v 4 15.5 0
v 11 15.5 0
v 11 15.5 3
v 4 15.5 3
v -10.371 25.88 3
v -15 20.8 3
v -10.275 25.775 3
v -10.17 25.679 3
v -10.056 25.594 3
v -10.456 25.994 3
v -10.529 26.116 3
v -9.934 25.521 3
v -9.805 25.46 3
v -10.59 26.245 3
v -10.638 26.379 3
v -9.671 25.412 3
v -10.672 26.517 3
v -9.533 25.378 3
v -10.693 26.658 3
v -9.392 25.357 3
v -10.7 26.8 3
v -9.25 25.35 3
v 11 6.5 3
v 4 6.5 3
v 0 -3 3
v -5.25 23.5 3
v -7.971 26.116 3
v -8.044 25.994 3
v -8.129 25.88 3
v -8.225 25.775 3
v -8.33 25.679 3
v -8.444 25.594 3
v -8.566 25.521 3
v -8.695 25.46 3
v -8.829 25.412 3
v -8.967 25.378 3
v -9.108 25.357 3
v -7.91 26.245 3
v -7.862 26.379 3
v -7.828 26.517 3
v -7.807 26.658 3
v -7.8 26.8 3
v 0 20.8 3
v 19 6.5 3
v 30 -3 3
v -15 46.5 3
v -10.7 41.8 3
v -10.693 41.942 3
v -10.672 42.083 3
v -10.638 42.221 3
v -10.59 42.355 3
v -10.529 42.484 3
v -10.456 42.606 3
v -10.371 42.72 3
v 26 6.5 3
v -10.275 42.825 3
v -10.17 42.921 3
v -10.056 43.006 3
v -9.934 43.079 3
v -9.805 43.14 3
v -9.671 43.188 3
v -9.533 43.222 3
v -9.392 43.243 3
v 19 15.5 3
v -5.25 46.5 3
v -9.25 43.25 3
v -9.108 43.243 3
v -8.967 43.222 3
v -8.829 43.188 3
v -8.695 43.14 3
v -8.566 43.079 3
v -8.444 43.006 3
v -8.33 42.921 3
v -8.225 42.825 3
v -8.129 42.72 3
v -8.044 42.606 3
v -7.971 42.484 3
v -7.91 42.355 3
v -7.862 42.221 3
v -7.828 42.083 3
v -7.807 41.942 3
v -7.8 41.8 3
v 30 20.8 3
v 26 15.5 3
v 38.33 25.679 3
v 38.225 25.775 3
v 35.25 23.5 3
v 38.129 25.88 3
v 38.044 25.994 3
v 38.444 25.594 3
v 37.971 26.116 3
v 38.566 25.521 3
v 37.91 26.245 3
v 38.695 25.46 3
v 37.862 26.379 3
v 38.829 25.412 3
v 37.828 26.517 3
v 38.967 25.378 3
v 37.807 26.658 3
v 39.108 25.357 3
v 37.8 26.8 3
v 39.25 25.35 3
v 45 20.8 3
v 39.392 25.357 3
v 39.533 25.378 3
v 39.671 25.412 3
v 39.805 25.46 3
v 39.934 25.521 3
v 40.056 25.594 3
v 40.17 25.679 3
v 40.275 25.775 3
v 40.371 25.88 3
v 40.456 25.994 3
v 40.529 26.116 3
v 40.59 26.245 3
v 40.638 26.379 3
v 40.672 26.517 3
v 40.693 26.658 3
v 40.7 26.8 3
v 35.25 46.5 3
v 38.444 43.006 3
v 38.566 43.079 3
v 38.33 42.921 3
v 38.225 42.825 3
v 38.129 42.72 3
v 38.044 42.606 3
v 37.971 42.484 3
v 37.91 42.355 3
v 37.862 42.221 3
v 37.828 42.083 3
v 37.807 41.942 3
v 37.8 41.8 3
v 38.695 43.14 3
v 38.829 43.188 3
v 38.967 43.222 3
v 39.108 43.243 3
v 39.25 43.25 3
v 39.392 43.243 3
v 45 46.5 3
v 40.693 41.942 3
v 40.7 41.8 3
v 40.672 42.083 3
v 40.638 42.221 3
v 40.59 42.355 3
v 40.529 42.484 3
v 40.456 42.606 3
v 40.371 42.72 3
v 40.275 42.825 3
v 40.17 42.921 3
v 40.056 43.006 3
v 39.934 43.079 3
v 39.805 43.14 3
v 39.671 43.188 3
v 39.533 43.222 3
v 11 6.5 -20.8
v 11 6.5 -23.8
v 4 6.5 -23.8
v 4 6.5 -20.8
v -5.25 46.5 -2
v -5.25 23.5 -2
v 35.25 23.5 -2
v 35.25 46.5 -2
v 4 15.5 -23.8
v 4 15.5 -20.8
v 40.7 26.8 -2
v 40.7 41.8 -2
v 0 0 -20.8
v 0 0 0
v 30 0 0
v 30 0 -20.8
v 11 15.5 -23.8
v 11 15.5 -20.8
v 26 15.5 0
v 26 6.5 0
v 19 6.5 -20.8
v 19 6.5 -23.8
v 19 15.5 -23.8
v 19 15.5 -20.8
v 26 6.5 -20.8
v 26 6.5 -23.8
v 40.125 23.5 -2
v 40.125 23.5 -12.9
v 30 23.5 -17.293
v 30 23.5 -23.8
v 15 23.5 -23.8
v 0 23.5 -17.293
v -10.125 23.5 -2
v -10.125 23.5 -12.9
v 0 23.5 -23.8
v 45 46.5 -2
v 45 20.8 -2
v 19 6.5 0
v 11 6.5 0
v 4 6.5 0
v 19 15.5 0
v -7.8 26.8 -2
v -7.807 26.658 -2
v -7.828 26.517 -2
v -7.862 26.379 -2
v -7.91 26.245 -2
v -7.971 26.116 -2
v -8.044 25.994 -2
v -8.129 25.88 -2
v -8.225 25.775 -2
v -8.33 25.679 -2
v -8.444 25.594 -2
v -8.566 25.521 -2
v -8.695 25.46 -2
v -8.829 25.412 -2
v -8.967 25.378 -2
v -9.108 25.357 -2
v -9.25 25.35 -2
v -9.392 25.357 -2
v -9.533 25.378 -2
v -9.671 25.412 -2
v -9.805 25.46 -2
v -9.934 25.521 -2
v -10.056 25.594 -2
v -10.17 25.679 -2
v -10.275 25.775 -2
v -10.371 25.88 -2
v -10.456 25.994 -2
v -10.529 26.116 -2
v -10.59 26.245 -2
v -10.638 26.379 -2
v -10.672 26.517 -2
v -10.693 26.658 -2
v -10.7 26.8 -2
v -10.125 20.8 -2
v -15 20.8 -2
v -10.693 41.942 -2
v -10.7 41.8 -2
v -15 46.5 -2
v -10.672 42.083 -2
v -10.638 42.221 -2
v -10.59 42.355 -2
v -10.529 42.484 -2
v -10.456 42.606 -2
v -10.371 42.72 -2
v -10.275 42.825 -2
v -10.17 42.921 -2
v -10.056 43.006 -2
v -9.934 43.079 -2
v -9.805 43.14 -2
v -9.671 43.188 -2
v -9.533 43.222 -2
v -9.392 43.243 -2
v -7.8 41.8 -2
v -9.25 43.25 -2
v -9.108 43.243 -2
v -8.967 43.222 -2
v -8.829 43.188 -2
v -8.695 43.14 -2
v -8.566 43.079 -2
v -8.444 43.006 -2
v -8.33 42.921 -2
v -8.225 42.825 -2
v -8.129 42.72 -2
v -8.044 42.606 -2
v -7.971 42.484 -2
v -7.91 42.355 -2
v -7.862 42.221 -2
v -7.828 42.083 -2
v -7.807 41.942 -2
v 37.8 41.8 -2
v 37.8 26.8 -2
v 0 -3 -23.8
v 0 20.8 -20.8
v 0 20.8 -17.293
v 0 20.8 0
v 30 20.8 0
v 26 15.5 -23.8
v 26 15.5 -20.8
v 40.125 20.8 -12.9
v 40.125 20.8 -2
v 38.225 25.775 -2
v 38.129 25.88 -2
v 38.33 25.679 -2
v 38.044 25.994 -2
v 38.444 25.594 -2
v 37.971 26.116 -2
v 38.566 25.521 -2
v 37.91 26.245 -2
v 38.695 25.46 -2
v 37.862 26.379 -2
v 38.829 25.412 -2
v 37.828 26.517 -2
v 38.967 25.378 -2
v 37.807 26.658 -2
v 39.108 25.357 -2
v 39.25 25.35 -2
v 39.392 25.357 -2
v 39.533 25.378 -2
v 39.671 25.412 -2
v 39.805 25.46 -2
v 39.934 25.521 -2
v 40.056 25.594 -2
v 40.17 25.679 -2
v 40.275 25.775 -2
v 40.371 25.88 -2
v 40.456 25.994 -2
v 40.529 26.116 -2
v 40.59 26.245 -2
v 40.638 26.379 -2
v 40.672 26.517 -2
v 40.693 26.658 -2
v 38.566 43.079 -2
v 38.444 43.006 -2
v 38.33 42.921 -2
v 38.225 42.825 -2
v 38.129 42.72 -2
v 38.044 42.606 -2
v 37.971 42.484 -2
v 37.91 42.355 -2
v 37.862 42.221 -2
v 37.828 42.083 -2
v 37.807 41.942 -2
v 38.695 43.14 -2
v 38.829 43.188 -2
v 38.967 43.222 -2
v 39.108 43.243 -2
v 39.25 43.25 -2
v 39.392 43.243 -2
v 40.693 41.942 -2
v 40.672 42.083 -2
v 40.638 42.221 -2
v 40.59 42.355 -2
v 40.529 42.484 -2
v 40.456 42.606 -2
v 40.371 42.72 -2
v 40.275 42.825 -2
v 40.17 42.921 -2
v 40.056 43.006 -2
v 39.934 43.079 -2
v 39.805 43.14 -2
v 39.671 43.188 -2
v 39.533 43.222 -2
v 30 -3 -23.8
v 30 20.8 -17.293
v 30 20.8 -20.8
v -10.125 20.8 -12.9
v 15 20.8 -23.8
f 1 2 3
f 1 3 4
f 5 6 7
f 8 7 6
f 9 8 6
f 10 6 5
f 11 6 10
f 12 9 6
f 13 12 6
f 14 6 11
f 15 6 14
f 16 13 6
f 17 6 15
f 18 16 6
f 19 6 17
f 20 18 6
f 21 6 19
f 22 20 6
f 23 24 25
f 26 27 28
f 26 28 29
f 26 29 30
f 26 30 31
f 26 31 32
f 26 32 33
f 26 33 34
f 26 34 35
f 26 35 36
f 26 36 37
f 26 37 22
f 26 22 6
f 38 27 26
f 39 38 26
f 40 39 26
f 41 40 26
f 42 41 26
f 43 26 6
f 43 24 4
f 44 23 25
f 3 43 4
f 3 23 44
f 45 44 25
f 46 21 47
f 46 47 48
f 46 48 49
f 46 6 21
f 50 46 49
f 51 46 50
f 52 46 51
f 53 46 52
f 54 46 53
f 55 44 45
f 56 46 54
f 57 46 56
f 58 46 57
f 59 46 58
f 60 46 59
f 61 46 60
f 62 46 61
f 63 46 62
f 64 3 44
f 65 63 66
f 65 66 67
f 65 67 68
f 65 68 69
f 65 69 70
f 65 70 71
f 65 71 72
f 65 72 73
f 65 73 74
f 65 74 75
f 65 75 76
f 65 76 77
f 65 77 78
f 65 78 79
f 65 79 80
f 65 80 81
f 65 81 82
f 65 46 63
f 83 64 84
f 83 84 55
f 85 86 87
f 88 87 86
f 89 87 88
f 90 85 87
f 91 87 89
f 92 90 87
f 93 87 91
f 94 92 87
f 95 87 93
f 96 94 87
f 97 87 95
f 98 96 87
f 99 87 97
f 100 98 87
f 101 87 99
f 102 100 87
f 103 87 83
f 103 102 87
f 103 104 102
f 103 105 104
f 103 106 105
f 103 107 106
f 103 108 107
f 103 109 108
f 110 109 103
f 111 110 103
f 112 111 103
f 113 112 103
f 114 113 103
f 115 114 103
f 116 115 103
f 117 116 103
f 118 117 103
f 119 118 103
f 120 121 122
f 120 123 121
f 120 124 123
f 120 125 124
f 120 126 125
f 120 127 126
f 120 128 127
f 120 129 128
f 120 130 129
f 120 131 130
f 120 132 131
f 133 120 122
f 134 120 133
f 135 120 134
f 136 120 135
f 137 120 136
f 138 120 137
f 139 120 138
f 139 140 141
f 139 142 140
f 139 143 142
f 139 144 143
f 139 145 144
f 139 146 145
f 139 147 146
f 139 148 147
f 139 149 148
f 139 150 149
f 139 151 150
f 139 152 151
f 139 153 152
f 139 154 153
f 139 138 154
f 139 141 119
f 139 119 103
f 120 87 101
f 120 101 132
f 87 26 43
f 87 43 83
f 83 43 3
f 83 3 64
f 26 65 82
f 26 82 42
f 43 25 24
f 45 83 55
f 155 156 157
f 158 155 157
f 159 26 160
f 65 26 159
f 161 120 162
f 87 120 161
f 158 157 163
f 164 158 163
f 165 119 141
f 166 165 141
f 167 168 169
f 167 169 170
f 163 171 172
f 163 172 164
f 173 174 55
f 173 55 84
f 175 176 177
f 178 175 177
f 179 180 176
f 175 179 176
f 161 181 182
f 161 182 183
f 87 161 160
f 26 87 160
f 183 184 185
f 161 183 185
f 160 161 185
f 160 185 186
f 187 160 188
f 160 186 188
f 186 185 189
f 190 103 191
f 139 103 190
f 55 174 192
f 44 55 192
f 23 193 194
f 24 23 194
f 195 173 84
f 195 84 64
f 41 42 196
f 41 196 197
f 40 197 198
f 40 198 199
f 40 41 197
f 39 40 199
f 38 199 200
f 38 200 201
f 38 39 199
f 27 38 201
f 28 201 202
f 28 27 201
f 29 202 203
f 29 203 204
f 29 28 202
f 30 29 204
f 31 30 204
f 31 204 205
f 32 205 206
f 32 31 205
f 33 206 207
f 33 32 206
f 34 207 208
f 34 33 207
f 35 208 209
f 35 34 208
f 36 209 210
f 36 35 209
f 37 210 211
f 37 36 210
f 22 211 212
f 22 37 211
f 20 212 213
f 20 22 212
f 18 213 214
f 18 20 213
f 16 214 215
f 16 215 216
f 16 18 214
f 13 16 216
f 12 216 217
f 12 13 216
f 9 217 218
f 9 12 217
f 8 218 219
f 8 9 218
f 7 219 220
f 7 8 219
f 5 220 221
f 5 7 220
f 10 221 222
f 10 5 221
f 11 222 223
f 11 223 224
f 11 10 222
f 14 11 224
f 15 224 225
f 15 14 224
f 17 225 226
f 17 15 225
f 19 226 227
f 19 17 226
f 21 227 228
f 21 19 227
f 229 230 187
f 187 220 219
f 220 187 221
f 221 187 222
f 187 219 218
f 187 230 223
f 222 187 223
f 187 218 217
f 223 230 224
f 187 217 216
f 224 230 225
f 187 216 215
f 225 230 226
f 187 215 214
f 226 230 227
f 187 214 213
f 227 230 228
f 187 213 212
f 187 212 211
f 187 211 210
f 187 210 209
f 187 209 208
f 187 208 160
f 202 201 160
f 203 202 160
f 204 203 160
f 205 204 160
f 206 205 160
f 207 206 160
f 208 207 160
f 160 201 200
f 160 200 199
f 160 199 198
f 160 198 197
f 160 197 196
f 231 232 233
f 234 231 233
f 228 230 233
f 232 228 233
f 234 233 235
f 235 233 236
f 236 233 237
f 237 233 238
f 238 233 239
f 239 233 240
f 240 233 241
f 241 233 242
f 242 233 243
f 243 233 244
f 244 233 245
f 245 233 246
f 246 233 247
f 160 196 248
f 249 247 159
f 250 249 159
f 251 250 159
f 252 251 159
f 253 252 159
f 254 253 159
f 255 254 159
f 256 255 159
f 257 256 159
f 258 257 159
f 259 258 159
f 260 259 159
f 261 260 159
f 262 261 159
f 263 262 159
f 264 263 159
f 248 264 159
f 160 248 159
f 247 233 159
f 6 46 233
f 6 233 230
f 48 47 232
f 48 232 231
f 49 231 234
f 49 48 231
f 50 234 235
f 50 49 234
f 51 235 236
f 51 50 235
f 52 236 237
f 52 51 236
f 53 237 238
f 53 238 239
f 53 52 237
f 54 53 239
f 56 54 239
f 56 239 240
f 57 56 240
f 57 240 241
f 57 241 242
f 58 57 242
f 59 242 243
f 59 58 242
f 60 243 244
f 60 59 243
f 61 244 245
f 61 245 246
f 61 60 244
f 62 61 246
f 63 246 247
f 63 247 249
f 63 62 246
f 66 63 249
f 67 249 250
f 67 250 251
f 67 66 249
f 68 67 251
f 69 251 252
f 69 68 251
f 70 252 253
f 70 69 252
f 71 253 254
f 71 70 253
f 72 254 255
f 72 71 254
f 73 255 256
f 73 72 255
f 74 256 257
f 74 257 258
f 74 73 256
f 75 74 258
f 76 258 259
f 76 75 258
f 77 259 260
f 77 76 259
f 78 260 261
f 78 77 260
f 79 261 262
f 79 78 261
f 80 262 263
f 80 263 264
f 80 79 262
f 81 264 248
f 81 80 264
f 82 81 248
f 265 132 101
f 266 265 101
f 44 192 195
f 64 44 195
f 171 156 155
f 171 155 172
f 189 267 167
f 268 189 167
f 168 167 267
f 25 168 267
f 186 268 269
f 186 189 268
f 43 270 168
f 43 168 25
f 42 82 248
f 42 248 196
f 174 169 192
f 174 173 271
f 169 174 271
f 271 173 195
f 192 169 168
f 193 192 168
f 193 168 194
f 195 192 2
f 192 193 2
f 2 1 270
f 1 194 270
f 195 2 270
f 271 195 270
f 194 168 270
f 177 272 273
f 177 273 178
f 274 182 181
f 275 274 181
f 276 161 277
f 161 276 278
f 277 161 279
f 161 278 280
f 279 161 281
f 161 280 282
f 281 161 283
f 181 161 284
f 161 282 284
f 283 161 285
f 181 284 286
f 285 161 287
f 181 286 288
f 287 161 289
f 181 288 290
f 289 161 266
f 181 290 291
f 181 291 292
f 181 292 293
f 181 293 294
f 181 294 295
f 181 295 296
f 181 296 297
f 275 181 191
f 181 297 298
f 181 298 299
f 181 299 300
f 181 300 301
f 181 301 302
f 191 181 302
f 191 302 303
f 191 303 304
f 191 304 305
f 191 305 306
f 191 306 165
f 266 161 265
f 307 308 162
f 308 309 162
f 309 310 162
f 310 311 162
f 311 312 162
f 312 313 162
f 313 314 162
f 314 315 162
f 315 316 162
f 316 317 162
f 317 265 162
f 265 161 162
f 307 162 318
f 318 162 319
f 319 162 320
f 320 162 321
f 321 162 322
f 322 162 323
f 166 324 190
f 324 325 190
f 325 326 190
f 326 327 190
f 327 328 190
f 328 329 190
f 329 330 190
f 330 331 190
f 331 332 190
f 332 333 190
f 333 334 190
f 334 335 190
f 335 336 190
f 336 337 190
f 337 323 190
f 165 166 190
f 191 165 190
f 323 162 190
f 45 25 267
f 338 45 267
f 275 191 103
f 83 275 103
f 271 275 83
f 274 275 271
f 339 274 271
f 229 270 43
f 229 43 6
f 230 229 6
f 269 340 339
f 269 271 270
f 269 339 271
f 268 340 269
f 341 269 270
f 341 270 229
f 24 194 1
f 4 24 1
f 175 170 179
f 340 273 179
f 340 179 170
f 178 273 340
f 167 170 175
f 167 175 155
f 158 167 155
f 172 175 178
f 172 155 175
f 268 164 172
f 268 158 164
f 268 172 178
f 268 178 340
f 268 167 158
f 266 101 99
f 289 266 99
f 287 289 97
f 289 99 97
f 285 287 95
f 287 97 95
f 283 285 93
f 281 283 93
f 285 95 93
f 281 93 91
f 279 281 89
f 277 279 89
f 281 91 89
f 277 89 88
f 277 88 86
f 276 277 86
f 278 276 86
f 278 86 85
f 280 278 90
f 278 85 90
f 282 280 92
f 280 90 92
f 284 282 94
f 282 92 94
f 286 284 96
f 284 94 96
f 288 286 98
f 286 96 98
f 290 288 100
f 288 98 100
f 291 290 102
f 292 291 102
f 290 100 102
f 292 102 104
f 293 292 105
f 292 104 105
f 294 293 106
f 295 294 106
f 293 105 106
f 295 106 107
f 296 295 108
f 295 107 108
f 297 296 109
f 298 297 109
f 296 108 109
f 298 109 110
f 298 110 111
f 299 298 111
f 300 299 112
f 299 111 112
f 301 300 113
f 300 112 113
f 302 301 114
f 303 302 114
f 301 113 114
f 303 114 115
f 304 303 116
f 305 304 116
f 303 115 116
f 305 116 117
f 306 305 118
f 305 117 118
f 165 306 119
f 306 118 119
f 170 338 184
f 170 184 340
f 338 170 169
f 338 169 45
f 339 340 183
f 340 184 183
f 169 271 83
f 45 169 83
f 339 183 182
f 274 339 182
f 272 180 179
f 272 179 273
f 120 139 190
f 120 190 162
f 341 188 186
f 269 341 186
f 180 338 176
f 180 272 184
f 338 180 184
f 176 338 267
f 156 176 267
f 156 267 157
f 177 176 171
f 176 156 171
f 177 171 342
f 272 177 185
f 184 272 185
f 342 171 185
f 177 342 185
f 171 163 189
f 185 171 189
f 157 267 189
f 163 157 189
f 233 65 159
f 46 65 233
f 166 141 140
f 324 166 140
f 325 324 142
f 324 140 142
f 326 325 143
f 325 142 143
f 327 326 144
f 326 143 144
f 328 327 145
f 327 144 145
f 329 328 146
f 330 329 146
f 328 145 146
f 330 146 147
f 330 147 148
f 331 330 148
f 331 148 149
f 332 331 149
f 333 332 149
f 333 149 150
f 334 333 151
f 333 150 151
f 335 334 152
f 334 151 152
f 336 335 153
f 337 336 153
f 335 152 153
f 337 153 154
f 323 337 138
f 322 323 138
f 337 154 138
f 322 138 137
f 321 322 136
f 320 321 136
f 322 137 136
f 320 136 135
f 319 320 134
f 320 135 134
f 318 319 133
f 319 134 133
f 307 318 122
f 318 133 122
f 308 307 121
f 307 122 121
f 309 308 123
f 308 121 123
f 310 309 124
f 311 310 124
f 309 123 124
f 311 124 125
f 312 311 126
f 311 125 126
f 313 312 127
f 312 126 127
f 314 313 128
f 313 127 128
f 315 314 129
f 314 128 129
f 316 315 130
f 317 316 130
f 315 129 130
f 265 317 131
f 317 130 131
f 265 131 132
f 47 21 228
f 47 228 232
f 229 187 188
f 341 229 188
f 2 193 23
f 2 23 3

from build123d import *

# Parameters (mm, degrees)
SKETCH_1_W          = 26.8
SKETCH_1_H          = 28
SKETCH_1_W_2        = 20.8
SKETCH_1_H_2        = 22
EXTRUDE_1_DEPTH     = 30
SKETCH_2_W          = 3
SKETCH_2_H          = 5
CUT_EXTRUDE_1_DEPTH = 30
SKETCH_3_W          = 20.8
SKETCH_3_H          = 1.2
EXTRUDE_2_DEPTH     = 30
SKETCH_4_W          = 26.962863122
SKETCH_4_H          = 1.5
CUT_EXTRUDE_2_DEPTH = 30
SKETCH_5_W          = 7
SKETCH_5_H          = 9
SKETCH_5_W_2        = 3
SKETCH_5_H_2        = 5
CUT_EXTRUDE_3_DEPTH = 47.588517899
EXTRUDE_3_DEPTH     = 5
EXTRUDE_4_DEPTH     = 2.7


with BuildPart() as part:
    # 草图1 → 凸台-拉伸1 (new body)
    with BuildSketch(Plane(origin=(0, 0, 0), x_dir=(0, 0, -1), z_dir=(1, 0, 0))):
        with Locations((10.4, 11)):
            Rectangle(SKETCH_1_W, SKETCH_1_H)
        with Locations((10.4, 11)):
            Rectangle(SKETCH_1_W_2, SKETCH_1_H_2, mode=Mode.SUBTRACT)
    extrude(amount=EXTRUDE_1_DEPTH)

    # 草图2 → 切除-拉伸1 (cut)
    with BuildSketch(Plane(origin=(0, 0, -23.8), x_dir=(-1, 0, 0), z_dir=(0, 0, -1))):
        with Locations((-22.5, 11)):
            Rectangle(SKETCH_2_W, SKETCH_2_H)
        with Locations((-7.5, 11)):
            Rectangle(SKETCH_2_W, SKETCH_2_H)
    extrude(amount=-CUT_EXTRUDE_1_DEPTH, mode=Mode.SUBTRACT)

    # 草图3 → 凸台-拉伸2 (add)
    with BuildSketch(Plane.ZY):
        with Locations((-10.4, 21.4)):
            Rectangle(SKETCH_3_W, SKETCH_3_H)
    extrude(amount=-EXTRUDE_2_DEPTH)

    # 草图4 → 切除-拉伸2 (cut)
    with BuildSketch(Plane.ZY):
        with Locations((-10.318568439, 24.25)):
            Rectangle(SKETCH_4_W, SKETCH_4_H)
    extrude(amount=-CUT_EXTRUDE_2_DEPTH, mode=Mode.SUBTRACT)

    # 草图5 → 切除-拉伸3 (cut, through all)
    # profile 1 of 2: a face of its own
    with BuildSketch(Plane(origin=(0, 0, -23.8), x_dir=(-1, 0, 0), z_dir=(0, 0, -1))):
        with Locations((-22.5, 11)):
            Rectangle(SKETCH_5_W, SKETCH_5_H)
        with Locations((-22.5, 11)):
            Rectangle(SKETCH_5_W_2, SKETCH_5_H_2, mode=Mode.SUBTRACT)
    # profile 2 of 2: a face of its own
    with BuildSketch(Plane(origin=(0, 0, -23.8), x_dir=(-1, 0, 0), z_dir=(0, 0, -1))):
        with Locations((-7.5, 11)):
            Rectangle(SKETCH_5_W, SKETCH_5_H)
        with Locations((-7.5, 11)):
            Rectangle(SKETCH_5_W_2, SKETCH_5_H_2, mode=Mode.SUBTRACT)
    extrude(amount=-CUT_EXTRUDE_3_DEPTH, mode=Mode.SUBTRACT)

    # 草图6 → 凸台-拉伸3 (add)
    with BuildSketch(Plane.XY.offset(3)):
        Polygon((45, 20.8), (45, 46.5), (35.25, 46.5), (35.25, 23.5), (-5.25, 23.5), (-5.25, 46.5), (-15, 46.5), (-15, 20.8), align=None)
        with BuildLine():
            Line((-7.8, 41.8), (-7.8, 26.8))
            ThreePointArc((-7.8, 26.8), (-9.25, 25.35), (-10.7, 26.8))
            Line((-10.7, 26.8), (-10.7, 41.8))
            ThreePointArc((-10.7, 41.8), (-9.25, 43.25), (-7.8, 41.8))
        make_face(mode=Mode.SUBTRACT)
        with BuildLine():
            Line((37.8, 41.8), (37.8, 26.8))
            ThreePointArc((37.8, 26.8), (39.25, 25.35), (40.7, 26.8))
            Line((40.7, 26.8), (40.7, 41.8))
            ThreePointArc((40.7, 41.8), (39.25, 43.25), (37.8, 41.8))
        make_face(mode=Mode.SUBTRACT)
    extrude(amount=-EXTRUDE_3_DEPTH)

    # 草图7 → 凸台-拉伸4 (add)
    with BuildSketch(Plane(origin=(0, 23.5, 0), x_dir=(1, 0, 0), z_dir=(0, 1, 0))):
        Polygon((-10.125, 2), (-10.125, 12.9), (15, 23.8), (40.125, 12.9), (40.125, 2), align=None)
    extrude(amount=-EXTRUDE_4_DEPTH)


solid = part.part
